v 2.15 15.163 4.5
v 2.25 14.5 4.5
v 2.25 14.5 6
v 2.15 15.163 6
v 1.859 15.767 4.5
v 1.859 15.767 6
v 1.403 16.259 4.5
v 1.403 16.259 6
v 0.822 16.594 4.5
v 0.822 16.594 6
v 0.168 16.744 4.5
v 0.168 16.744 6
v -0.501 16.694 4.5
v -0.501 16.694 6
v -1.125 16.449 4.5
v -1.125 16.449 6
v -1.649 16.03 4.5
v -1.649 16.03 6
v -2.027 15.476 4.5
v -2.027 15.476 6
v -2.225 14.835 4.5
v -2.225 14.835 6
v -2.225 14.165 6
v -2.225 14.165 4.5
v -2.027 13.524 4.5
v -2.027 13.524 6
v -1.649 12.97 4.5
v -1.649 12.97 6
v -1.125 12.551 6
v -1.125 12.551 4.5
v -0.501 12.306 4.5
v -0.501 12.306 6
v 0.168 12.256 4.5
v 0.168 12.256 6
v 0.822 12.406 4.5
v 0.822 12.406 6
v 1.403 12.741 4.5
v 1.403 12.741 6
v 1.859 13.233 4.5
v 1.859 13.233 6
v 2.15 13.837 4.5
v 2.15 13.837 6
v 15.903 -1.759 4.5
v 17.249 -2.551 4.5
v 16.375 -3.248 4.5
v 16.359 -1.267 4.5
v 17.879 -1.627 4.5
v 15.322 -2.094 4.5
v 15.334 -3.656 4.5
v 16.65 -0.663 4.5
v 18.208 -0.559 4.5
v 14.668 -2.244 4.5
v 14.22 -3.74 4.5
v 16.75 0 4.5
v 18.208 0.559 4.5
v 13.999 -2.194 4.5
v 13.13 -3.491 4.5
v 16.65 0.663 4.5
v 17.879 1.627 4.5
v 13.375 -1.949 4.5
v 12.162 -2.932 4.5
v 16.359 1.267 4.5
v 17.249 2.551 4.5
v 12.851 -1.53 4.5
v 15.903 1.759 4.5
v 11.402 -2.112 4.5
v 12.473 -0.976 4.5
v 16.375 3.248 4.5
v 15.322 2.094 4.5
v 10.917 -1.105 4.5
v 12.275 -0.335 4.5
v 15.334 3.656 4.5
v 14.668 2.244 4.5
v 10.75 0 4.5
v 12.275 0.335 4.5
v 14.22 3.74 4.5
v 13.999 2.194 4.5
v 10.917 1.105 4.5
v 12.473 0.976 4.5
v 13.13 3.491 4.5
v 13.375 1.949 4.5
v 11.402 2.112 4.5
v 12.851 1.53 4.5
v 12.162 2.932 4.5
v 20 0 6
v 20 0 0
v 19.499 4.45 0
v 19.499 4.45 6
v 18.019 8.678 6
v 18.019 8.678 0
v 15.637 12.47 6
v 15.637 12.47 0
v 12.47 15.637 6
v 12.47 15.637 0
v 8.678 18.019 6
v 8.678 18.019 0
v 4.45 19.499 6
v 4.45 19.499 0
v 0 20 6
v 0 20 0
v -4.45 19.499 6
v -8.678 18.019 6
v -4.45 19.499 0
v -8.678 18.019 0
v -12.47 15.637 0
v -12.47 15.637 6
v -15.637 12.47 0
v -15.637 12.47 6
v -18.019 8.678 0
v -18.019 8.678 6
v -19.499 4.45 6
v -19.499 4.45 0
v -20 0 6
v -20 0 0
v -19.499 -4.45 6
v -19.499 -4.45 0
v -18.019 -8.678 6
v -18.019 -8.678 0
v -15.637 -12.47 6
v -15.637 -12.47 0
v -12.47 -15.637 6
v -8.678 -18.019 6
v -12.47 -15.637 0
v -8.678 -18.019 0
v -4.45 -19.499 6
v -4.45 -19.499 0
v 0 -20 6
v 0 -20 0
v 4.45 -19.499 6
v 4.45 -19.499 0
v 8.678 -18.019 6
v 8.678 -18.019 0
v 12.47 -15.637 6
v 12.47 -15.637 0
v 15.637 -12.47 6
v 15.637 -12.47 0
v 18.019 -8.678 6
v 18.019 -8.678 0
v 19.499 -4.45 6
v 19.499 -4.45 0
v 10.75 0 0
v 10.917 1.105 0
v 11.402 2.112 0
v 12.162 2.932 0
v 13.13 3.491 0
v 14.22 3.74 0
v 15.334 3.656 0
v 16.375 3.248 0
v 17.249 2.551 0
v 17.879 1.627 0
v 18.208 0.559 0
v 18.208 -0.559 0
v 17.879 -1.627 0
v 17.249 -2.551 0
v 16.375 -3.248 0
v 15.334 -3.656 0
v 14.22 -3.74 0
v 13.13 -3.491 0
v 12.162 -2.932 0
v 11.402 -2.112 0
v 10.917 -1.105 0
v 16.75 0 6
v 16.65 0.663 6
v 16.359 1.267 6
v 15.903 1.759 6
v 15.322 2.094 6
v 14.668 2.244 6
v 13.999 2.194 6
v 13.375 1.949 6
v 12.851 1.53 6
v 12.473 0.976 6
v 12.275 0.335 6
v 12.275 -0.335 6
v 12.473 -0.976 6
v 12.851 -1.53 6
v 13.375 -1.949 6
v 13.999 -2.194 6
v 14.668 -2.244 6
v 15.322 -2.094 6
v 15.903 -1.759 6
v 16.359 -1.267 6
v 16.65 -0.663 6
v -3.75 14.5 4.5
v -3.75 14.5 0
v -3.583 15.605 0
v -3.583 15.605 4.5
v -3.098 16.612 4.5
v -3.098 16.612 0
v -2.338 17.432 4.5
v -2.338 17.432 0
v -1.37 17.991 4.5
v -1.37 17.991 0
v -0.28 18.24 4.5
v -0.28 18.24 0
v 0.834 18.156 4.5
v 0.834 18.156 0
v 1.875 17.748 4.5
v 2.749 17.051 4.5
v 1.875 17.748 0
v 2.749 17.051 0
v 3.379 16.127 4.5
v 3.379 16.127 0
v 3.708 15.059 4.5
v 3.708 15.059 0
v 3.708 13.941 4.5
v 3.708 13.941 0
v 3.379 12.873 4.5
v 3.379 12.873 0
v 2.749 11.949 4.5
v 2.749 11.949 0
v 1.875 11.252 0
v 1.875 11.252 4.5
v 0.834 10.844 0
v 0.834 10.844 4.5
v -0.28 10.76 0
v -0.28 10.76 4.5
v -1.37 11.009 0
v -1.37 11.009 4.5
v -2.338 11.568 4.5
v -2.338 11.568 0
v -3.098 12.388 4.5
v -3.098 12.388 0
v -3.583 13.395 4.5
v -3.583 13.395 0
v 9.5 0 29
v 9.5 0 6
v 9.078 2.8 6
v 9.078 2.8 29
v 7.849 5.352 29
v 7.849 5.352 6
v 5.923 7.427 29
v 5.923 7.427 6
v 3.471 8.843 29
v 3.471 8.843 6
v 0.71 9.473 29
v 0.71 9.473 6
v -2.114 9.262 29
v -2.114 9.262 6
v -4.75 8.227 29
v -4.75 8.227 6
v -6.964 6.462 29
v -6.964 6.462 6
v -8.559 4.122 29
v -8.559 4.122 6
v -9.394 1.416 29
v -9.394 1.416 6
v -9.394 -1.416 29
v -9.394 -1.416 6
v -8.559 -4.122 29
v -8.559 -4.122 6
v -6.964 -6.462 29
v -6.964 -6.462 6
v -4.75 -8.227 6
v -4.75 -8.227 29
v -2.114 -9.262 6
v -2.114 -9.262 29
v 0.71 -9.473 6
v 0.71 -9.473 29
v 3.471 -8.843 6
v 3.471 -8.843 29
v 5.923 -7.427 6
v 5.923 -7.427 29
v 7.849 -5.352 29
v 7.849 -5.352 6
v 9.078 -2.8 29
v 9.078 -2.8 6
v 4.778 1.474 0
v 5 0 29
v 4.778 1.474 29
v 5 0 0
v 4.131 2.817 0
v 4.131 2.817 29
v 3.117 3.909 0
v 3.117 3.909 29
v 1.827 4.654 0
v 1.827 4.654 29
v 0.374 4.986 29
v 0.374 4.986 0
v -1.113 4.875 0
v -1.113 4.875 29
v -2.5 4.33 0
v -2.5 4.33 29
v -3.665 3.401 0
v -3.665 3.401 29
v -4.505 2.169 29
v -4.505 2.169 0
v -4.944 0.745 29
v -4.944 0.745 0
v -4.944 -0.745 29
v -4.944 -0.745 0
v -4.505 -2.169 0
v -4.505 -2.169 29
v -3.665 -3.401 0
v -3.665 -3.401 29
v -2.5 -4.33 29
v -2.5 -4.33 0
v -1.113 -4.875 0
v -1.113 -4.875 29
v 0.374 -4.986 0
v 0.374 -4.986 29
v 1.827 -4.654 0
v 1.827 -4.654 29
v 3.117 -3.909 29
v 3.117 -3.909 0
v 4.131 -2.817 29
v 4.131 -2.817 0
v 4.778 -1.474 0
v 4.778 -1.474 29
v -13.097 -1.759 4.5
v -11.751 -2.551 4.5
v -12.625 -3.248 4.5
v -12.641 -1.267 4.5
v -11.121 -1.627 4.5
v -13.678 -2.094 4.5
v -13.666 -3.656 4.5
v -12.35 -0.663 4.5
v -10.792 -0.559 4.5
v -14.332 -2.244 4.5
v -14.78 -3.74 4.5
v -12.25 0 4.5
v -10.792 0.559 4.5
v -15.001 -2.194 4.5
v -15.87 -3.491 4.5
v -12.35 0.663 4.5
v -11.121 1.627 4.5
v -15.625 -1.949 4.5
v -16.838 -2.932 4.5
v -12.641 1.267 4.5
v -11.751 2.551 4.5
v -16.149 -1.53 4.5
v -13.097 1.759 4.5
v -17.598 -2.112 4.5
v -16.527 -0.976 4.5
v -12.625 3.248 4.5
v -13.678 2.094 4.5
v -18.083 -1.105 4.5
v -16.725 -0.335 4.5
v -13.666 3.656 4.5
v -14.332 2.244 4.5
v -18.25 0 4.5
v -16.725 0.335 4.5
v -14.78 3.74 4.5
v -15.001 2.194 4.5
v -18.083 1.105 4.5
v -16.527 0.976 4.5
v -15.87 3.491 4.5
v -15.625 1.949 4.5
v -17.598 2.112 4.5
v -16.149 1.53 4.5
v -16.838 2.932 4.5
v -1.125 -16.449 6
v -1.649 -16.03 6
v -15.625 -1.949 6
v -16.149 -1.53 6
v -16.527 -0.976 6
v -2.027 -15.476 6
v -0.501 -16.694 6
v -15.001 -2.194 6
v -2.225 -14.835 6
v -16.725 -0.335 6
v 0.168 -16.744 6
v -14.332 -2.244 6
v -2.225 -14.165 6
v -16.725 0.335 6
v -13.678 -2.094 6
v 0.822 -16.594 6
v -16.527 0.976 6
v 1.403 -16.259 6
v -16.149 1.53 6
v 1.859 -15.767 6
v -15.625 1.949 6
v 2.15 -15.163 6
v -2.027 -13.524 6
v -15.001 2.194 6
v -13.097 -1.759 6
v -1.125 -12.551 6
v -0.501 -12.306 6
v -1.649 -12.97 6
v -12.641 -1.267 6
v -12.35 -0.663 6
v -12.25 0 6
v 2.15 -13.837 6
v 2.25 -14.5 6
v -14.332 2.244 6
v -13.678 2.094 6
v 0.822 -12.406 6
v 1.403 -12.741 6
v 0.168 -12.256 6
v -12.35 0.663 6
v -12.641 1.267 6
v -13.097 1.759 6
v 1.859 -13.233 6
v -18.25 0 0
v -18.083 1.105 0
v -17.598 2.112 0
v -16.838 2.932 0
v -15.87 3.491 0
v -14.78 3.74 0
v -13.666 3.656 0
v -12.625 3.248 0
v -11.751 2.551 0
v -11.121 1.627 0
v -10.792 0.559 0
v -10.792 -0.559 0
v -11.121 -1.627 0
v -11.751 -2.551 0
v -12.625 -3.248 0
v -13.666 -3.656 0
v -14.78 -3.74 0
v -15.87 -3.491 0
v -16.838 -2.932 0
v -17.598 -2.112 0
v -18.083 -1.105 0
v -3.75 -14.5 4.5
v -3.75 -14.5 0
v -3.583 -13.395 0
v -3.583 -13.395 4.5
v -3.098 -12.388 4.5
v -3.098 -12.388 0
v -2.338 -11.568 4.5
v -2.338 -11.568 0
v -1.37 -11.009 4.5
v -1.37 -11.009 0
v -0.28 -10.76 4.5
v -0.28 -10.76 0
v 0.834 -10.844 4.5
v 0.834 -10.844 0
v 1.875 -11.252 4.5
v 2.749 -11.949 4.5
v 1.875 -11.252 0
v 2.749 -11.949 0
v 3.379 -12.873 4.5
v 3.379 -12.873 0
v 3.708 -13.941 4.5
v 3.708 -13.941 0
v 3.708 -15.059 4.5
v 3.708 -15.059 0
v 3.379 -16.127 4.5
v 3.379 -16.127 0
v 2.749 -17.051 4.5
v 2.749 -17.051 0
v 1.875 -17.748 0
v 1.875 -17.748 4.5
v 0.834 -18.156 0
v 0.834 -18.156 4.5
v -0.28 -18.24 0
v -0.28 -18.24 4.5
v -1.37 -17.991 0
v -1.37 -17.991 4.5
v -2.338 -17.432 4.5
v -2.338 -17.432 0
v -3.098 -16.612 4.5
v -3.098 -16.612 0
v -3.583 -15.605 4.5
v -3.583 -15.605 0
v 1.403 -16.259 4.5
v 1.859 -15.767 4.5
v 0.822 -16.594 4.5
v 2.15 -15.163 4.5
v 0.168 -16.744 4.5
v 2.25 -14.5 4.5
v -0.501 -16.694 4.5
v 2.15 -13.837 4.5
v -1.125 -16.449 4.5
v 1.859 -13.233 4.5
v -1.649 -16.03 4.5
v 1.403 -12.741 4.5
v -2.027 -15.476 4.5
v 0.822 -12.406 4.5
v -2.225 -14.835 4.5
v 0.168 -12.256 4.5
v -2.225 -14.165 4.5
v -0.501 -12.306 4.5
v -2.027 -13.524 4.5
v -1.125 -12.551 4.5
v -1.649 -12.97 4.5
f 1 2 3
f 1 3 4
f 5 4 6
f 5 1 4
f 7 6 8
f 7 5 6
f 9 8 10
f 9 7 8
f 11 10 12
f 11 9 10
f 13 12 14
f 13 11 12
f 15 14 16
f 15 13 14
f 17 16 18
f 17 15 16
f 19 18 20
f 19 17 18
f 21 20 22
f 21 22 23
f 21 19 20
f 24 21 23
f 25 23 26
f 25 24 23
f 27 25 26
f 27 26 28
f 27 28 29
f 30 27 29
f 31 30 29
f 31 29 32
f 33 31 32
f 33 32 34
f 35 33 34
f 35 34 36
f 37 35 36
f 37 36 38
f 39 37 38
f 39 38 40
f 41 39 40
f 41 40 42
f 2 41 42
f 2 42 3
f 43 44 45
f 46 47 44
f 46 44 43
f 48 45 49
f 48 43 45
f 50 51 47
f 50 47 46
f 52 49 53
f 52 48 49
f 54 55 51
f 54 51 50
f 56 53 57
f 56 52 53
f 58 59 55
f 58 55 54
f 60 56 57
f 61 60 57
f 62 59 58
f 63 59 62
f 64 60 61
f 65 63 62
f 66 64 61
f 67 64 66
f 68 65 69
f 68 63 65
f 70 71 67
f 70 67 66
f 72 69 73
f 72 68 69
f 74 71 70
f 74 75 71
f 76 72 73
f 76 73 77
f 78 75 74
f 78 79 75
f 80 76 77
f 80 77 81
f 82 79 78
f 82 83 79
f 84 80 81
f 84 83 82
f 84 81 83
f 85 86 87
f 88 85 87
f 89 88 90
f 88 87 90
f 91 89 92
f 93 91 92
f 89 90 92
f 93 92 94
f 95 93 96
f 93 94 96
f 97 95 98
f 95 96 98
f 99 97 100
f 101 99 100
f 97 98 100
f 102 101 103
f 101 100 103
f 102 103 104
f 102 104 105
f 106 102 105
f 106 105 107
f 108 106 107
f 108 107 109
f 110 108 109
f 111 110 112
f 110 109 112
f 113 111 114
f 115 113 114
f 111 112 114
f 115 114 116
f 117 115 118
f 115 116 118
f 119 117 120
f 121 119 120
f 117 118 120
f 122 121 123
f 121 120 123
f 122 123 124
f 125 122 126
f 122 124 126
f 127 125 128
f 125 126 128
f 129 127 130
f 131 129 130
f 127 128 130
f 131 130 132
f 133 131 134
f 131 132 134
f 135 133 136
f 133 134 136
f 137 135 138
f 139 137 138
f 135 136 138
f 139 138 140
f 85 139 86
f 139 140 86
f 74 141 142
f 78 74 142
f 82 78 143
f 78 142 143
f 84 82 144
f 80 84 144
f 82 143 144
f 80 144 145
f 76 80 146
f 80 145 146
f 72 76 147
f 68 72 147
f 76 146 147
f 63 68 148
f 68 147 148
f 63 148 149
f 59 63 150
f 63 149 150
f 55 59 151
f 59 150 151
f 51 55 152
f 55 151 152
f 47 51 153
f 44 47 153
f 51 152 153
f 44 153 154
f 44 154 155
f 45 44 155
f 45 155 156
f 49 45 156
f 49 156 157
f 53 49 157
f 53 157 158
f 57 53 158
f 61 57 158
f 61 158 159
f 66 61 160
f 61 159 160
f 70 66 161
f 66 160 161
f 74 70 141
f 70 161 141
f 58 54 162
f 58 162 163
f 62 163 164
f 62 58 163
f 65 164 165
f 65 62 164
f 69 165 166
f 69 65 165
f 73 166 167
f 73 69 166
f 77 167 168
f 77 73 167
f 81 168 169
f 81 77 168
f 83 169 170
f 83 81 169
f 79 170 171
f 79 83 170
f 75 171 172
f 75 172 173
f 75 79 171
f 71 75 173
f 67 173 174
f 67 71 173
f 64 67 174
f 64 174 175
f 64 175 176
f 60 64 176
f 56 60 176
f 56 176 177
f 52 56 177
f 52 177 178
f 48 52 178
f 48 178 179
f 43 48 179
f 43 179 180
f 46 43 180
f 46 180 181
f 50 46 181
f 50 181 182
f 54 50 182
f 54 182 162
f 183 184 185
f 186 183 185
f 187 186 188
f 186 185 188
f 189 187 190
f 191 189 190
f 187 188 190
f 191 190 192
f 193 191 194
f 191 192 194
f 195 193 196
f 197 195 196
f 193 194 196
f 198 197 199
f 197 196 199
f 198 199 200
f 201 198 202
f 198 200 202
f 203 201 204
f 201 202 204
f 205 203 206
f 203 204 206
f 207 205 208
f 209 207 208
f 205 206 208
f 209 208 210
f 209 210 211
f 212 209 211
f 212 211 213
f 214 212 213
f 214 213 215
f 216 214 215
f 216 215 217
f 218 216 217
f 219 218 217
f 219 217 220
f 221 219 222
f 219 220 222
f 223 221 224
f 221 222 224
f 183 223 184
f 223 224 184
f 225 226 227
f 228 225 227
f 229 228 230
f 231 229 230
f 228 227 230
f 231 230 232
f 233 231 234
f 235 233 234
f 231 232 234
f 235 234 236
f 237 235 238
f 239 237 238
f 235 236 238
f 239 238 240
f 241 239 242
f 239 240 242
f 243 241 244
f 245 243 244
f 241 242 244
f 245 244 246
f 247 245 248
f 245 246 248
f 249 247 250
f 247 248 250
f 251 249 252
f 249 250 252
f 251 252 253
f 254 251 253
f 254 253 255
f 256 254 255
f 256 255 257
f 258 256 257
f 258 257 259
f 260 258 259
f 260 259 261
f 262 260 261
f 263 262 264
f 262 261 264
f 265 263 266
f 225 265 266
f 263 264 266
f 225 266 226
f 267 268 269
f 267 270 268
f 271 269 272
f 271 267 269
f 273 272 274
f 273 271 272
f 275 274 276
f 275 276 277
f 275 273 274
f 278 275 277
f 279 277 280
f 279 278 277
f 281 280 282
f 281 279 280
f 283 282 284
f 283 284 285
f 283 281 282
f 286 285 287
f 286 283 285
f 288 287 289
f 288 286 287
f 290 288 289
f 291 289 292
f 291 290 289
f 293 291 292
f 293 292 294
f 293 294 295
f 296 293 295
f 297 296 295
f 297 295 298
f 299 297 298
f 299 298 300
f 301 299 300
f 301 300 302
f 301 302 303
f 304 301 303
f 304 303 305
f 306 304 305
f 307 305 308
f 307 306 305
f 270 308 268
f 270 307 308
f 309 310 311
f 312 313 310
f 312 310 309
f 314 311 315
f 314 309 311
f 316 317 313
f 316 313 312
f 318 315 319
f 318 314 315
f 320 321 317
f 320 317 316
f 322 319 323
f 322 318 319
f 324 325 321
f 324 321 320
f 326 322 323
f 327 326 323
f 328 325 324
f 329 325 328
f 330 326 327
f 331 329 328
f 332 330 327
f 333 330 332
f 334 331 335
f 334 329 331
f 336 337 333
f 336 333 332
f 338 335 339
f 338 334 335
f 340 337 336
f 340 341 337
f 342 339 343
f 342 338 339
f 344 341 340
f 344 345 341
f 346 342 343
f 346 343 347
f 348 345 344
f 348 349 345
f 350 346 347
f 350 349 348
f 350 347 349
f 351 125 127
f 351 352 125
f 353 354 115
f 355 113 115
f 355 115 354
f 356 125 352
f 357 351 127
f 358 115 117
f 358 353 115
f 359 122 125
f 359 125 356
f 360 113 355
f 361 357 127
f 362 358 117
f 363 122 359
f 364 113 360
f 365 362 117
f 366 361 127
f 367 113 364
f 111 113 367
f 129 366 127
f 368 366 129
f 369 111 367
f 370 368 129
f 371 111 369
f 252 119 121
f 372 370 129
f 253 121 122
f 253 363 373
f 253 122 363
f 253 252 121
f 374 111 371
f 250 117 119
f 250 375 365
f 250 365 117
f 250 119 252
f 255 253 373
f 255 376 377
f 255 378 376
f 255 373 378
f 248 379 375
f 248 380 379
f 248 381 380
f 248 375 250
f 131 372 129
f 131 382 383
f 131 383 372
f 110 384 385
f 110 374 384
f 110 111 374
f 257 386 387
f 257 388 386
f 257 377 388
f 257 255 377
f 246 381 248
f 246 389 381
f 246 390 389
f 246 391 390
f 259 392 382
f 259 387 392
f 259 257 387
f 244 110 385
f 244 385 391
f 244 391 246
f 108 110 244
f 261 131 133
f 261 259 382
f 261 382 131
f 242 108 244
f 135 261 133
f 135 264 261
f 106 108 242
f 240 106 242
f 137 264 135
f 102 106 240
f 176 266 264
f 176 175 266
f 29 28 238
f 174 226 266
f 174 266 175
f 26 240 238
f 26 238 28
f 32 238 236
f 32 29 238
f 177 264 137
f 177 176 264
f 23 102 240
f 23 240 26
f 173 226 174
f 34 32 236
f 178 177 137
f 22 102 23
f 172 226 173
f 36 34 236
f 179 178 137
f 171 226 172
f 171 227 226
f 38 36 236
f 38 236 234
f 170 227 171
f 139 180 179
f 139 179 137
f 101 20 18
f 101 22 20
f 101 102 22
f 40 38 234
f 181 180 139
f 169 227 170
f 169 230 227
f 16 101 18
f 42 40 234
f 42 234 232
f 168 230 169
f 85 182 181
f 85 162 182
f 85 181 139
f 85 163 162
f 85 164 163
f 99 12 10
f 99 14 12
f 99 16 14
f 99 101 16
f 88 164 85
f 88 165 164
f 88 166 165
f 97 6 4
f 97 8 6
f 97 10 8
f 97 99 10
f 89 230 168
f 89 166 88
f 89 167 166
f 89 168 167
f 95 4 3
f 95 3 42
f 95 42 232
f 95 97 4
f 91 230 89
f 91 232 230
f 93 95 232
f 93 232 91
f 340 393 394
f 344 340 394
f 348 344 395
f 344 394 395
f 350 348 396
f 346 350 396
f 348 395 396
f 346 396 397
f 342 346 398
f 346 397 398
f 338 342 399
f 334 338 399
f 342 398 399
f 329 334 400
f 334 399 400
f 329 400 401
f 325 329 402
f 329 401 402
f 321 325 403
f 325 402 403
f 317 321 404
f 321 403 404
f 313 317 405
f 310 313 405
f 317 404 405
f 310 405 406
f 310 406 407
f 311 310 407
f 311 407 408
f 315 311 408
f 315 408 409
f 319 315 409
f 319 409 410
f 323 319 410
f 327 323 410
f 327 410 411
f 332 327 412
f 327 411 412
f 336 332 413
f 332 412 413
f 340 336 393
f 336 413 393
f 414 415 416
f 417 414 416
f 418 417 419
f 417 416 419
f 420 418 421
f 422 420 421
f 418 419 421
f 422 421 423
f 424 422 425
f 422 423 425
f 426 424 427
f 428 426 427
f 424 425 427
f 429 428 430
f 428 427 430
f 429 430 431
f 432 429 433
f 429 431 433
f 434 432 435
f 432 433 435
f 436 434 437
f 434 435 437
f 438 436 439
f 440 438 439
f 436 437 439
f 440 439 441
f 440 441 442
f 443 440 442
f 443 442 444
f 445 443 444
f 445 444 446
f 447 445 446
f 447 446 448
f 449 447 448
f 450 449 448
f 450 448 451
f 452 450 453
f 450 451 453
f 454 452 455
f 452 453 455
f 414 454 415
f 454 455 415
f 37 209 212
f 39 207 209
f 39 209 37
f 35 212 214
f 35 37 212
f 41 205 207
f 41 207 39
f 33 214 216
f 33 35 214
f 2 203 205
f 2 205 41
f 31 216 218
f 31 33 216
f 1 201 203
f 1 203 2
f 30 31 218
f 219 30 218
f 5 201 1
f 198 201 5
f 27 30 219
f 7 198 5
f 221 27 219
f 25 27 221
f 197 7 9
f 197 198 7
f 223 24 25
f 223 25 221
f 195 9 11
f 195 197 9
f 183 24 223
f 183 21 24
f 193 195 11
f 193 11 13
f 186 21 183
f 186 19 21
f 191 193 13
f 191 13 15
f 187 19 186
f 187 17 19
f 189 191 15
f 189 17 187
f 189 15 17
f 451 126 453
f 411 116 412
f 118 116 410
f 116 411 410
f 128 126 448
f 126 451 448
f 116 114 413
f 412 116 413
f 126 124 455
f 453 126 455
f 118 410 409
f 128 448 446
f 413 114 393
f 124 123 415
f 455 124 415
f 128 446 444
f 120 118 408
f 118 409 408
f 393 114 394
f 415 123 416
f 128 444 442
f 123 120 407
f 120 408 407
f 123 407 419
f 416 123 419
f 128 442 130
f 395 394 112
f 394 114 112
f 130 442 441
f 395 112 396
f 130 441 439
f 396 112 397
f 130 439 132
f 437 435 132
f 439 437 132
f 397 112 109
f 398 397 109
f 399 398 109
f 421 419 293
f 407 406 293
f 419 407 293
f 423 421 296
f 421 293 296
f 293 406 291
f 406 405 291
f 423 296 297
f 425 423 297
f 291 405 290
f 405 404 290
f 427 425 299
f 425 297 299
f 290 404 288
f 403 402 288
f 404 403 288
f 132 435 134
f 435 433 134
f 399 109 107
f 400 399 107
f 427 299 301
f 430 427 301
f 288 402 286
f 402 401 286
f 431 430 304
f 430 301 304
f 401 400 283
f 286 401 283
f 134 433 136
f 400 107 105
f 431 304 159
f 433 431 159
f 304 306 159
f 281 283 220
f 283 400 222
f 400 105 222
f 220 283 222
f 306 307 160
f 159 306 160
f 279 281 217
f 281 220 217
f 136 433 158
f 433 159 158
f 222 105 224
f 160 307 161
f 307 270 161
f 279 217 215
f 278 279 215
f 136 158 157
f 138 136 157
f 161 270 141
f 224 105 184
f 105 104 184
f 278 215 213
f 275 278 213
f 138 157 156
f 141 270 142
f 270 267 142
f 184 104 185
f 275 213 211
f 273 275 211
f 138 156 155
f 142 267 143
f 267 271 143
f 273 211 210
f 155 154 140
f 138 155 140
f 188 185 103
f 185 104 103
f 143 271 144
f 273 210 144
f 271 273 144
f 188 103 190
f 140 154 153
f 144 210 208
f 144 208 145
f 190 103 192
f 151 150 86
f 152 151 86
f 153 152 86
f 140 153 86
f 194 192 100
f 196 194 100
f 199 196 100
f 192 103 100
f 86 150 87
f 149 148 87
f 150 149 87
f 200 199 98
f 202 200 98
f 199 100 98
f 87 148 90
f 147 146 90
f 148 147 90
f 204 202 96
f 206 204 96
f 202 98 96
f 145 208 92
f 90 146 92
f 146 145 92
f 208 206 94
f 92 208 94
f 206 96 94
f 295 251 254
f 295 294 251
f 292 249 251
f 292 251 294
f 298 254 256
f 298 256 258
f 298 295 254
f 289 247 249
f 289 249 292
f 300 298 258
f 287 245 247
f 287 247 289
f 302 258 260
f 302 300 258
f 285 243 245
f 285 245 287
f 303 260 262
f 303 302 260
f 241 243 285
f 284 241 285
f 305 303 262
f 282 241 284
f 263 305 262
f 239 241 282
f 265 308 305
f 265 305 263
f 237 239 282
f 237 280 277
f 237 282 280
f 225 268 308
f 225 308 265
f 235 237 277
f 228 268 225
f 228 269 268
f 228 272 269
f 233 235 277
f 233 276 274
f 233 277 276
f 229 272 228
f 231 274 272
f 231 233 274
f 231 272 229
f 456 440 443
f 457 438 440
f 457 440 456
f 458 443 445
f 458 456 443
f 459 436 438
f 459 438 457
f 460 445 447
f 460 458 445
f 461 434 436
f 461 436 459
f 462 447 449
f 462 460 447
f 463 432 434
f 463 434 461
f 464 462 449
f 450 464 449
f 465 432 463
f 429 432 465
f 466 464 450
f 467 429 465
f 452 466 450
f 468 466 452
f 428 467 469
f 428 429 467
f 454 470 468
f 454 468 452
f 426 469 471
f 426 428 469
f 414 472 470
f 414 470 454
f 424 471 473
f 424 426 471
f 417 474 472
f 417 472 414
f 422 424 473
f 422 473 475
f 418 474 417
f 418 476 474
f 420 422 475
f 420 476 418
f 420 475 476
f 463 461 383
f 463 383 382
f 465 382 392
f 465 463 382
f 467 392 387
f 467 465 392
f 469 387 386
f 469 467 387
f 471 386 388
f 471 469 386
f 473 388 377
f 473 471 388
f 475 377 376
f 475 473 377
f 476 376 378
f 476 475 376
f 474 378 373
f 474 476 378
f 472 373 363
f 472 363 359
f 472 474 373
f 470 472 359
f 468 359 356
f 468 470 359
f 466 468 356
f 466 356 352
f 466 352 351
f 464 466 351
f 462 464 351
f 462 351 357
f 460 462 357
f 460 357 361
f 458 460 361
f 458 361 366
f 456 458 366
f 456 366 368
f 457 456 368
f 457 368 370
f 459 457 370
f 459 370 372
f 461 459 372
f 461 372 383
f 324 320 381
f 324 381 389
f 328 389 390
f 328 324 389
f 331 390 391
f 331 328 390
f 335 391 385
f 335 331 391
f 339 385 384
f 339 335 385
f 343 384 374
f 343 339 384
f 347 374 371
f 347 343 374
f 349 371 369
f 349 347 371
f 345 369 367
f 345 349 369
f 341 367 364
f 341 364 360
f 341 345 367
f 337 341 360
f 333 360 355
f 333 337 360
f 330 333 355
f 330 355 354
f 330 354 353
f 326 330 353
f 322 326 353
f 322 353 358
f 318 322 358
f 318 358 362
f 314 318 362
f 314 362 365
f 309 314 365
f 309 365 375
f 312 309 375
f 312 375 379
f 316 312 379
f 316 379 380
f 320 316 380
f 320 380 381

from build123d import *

# Parameters (mm, degrees)
SKETCH_1_R          = 20
SKETCH_1_R_2        = 5
SKETCH_1_R_3        = 2.25
EXTRUDE_1_DEPTH     = 6
SKETCH_2_R          = 9.5
SKETCH_2_R_2        = 5
EXTRUDE_2_DEPTH     = 23
SKETCH_3_R          = 3.75
CUT_EXTRUDE_1_DEPTH = 4.5


with BuildPart() as part:
    # Эскиз1 → Бобышка-Вытянуть1 (new body)
    with BuildSketch(Plane.XY):
        Circle(SKETCH_1_R)
        Circle(SKETCH_1_R_2, mode=Mode.SUBTRACT)
        with Locations((0, 14.5)):
            Circle(SKETCH_1_R_3, mode=Mode.SUBTRACT)
        with Locations((14.5, 0)):
            Circle(SKETCH_1_R_3, mode=Mode.SUBTRACT)
        with Locations((0, -14.5)):
            Circle(SKETCH_1_R_3, mode=Mode.SUBTRACT)
        with Locations((-14.5, 0)):
            Circle(SKETCH_1_R_3, mode=Mode.SUBTRACT)
    extrude(amount=EXTRUDE_1_DEPTH)

    # Эскиз2 → Бобышка-Вытянуть2 (add)
    with BuildSketch(Plane.XY.offset(6)):
        Circle(SKETCH_2_R)
        Circle(SKETCH_2_R_2, mode=Mode.SUBTRACT)
    extrude(amount=EXTRUDE_2_DEPTH)

    # Эскиз3 → Вырез-Вытянуть1 (cut)
    with BuildSketch(Plane(origin=(0, 0, 0), x_dir=(-1, 0, 0), z_dir=(0, 0, -1))):
        with Locations((0, 14.5)):
            Circle(SKETCH_3_R)
        with Locations((14.5, 0)):
            Circle(SKETCH_3_R)
        with Locations((0, -14.5)):
            Circle(SKETCH_3_R)
        with Locations((-14.5, 0)):
            Circle(SKETCH_3_R)
    extrude(amount=-CUT_EXTRUDE_1_DEPTH, mode=Mode.SUBTRACT)


solid = part.part
